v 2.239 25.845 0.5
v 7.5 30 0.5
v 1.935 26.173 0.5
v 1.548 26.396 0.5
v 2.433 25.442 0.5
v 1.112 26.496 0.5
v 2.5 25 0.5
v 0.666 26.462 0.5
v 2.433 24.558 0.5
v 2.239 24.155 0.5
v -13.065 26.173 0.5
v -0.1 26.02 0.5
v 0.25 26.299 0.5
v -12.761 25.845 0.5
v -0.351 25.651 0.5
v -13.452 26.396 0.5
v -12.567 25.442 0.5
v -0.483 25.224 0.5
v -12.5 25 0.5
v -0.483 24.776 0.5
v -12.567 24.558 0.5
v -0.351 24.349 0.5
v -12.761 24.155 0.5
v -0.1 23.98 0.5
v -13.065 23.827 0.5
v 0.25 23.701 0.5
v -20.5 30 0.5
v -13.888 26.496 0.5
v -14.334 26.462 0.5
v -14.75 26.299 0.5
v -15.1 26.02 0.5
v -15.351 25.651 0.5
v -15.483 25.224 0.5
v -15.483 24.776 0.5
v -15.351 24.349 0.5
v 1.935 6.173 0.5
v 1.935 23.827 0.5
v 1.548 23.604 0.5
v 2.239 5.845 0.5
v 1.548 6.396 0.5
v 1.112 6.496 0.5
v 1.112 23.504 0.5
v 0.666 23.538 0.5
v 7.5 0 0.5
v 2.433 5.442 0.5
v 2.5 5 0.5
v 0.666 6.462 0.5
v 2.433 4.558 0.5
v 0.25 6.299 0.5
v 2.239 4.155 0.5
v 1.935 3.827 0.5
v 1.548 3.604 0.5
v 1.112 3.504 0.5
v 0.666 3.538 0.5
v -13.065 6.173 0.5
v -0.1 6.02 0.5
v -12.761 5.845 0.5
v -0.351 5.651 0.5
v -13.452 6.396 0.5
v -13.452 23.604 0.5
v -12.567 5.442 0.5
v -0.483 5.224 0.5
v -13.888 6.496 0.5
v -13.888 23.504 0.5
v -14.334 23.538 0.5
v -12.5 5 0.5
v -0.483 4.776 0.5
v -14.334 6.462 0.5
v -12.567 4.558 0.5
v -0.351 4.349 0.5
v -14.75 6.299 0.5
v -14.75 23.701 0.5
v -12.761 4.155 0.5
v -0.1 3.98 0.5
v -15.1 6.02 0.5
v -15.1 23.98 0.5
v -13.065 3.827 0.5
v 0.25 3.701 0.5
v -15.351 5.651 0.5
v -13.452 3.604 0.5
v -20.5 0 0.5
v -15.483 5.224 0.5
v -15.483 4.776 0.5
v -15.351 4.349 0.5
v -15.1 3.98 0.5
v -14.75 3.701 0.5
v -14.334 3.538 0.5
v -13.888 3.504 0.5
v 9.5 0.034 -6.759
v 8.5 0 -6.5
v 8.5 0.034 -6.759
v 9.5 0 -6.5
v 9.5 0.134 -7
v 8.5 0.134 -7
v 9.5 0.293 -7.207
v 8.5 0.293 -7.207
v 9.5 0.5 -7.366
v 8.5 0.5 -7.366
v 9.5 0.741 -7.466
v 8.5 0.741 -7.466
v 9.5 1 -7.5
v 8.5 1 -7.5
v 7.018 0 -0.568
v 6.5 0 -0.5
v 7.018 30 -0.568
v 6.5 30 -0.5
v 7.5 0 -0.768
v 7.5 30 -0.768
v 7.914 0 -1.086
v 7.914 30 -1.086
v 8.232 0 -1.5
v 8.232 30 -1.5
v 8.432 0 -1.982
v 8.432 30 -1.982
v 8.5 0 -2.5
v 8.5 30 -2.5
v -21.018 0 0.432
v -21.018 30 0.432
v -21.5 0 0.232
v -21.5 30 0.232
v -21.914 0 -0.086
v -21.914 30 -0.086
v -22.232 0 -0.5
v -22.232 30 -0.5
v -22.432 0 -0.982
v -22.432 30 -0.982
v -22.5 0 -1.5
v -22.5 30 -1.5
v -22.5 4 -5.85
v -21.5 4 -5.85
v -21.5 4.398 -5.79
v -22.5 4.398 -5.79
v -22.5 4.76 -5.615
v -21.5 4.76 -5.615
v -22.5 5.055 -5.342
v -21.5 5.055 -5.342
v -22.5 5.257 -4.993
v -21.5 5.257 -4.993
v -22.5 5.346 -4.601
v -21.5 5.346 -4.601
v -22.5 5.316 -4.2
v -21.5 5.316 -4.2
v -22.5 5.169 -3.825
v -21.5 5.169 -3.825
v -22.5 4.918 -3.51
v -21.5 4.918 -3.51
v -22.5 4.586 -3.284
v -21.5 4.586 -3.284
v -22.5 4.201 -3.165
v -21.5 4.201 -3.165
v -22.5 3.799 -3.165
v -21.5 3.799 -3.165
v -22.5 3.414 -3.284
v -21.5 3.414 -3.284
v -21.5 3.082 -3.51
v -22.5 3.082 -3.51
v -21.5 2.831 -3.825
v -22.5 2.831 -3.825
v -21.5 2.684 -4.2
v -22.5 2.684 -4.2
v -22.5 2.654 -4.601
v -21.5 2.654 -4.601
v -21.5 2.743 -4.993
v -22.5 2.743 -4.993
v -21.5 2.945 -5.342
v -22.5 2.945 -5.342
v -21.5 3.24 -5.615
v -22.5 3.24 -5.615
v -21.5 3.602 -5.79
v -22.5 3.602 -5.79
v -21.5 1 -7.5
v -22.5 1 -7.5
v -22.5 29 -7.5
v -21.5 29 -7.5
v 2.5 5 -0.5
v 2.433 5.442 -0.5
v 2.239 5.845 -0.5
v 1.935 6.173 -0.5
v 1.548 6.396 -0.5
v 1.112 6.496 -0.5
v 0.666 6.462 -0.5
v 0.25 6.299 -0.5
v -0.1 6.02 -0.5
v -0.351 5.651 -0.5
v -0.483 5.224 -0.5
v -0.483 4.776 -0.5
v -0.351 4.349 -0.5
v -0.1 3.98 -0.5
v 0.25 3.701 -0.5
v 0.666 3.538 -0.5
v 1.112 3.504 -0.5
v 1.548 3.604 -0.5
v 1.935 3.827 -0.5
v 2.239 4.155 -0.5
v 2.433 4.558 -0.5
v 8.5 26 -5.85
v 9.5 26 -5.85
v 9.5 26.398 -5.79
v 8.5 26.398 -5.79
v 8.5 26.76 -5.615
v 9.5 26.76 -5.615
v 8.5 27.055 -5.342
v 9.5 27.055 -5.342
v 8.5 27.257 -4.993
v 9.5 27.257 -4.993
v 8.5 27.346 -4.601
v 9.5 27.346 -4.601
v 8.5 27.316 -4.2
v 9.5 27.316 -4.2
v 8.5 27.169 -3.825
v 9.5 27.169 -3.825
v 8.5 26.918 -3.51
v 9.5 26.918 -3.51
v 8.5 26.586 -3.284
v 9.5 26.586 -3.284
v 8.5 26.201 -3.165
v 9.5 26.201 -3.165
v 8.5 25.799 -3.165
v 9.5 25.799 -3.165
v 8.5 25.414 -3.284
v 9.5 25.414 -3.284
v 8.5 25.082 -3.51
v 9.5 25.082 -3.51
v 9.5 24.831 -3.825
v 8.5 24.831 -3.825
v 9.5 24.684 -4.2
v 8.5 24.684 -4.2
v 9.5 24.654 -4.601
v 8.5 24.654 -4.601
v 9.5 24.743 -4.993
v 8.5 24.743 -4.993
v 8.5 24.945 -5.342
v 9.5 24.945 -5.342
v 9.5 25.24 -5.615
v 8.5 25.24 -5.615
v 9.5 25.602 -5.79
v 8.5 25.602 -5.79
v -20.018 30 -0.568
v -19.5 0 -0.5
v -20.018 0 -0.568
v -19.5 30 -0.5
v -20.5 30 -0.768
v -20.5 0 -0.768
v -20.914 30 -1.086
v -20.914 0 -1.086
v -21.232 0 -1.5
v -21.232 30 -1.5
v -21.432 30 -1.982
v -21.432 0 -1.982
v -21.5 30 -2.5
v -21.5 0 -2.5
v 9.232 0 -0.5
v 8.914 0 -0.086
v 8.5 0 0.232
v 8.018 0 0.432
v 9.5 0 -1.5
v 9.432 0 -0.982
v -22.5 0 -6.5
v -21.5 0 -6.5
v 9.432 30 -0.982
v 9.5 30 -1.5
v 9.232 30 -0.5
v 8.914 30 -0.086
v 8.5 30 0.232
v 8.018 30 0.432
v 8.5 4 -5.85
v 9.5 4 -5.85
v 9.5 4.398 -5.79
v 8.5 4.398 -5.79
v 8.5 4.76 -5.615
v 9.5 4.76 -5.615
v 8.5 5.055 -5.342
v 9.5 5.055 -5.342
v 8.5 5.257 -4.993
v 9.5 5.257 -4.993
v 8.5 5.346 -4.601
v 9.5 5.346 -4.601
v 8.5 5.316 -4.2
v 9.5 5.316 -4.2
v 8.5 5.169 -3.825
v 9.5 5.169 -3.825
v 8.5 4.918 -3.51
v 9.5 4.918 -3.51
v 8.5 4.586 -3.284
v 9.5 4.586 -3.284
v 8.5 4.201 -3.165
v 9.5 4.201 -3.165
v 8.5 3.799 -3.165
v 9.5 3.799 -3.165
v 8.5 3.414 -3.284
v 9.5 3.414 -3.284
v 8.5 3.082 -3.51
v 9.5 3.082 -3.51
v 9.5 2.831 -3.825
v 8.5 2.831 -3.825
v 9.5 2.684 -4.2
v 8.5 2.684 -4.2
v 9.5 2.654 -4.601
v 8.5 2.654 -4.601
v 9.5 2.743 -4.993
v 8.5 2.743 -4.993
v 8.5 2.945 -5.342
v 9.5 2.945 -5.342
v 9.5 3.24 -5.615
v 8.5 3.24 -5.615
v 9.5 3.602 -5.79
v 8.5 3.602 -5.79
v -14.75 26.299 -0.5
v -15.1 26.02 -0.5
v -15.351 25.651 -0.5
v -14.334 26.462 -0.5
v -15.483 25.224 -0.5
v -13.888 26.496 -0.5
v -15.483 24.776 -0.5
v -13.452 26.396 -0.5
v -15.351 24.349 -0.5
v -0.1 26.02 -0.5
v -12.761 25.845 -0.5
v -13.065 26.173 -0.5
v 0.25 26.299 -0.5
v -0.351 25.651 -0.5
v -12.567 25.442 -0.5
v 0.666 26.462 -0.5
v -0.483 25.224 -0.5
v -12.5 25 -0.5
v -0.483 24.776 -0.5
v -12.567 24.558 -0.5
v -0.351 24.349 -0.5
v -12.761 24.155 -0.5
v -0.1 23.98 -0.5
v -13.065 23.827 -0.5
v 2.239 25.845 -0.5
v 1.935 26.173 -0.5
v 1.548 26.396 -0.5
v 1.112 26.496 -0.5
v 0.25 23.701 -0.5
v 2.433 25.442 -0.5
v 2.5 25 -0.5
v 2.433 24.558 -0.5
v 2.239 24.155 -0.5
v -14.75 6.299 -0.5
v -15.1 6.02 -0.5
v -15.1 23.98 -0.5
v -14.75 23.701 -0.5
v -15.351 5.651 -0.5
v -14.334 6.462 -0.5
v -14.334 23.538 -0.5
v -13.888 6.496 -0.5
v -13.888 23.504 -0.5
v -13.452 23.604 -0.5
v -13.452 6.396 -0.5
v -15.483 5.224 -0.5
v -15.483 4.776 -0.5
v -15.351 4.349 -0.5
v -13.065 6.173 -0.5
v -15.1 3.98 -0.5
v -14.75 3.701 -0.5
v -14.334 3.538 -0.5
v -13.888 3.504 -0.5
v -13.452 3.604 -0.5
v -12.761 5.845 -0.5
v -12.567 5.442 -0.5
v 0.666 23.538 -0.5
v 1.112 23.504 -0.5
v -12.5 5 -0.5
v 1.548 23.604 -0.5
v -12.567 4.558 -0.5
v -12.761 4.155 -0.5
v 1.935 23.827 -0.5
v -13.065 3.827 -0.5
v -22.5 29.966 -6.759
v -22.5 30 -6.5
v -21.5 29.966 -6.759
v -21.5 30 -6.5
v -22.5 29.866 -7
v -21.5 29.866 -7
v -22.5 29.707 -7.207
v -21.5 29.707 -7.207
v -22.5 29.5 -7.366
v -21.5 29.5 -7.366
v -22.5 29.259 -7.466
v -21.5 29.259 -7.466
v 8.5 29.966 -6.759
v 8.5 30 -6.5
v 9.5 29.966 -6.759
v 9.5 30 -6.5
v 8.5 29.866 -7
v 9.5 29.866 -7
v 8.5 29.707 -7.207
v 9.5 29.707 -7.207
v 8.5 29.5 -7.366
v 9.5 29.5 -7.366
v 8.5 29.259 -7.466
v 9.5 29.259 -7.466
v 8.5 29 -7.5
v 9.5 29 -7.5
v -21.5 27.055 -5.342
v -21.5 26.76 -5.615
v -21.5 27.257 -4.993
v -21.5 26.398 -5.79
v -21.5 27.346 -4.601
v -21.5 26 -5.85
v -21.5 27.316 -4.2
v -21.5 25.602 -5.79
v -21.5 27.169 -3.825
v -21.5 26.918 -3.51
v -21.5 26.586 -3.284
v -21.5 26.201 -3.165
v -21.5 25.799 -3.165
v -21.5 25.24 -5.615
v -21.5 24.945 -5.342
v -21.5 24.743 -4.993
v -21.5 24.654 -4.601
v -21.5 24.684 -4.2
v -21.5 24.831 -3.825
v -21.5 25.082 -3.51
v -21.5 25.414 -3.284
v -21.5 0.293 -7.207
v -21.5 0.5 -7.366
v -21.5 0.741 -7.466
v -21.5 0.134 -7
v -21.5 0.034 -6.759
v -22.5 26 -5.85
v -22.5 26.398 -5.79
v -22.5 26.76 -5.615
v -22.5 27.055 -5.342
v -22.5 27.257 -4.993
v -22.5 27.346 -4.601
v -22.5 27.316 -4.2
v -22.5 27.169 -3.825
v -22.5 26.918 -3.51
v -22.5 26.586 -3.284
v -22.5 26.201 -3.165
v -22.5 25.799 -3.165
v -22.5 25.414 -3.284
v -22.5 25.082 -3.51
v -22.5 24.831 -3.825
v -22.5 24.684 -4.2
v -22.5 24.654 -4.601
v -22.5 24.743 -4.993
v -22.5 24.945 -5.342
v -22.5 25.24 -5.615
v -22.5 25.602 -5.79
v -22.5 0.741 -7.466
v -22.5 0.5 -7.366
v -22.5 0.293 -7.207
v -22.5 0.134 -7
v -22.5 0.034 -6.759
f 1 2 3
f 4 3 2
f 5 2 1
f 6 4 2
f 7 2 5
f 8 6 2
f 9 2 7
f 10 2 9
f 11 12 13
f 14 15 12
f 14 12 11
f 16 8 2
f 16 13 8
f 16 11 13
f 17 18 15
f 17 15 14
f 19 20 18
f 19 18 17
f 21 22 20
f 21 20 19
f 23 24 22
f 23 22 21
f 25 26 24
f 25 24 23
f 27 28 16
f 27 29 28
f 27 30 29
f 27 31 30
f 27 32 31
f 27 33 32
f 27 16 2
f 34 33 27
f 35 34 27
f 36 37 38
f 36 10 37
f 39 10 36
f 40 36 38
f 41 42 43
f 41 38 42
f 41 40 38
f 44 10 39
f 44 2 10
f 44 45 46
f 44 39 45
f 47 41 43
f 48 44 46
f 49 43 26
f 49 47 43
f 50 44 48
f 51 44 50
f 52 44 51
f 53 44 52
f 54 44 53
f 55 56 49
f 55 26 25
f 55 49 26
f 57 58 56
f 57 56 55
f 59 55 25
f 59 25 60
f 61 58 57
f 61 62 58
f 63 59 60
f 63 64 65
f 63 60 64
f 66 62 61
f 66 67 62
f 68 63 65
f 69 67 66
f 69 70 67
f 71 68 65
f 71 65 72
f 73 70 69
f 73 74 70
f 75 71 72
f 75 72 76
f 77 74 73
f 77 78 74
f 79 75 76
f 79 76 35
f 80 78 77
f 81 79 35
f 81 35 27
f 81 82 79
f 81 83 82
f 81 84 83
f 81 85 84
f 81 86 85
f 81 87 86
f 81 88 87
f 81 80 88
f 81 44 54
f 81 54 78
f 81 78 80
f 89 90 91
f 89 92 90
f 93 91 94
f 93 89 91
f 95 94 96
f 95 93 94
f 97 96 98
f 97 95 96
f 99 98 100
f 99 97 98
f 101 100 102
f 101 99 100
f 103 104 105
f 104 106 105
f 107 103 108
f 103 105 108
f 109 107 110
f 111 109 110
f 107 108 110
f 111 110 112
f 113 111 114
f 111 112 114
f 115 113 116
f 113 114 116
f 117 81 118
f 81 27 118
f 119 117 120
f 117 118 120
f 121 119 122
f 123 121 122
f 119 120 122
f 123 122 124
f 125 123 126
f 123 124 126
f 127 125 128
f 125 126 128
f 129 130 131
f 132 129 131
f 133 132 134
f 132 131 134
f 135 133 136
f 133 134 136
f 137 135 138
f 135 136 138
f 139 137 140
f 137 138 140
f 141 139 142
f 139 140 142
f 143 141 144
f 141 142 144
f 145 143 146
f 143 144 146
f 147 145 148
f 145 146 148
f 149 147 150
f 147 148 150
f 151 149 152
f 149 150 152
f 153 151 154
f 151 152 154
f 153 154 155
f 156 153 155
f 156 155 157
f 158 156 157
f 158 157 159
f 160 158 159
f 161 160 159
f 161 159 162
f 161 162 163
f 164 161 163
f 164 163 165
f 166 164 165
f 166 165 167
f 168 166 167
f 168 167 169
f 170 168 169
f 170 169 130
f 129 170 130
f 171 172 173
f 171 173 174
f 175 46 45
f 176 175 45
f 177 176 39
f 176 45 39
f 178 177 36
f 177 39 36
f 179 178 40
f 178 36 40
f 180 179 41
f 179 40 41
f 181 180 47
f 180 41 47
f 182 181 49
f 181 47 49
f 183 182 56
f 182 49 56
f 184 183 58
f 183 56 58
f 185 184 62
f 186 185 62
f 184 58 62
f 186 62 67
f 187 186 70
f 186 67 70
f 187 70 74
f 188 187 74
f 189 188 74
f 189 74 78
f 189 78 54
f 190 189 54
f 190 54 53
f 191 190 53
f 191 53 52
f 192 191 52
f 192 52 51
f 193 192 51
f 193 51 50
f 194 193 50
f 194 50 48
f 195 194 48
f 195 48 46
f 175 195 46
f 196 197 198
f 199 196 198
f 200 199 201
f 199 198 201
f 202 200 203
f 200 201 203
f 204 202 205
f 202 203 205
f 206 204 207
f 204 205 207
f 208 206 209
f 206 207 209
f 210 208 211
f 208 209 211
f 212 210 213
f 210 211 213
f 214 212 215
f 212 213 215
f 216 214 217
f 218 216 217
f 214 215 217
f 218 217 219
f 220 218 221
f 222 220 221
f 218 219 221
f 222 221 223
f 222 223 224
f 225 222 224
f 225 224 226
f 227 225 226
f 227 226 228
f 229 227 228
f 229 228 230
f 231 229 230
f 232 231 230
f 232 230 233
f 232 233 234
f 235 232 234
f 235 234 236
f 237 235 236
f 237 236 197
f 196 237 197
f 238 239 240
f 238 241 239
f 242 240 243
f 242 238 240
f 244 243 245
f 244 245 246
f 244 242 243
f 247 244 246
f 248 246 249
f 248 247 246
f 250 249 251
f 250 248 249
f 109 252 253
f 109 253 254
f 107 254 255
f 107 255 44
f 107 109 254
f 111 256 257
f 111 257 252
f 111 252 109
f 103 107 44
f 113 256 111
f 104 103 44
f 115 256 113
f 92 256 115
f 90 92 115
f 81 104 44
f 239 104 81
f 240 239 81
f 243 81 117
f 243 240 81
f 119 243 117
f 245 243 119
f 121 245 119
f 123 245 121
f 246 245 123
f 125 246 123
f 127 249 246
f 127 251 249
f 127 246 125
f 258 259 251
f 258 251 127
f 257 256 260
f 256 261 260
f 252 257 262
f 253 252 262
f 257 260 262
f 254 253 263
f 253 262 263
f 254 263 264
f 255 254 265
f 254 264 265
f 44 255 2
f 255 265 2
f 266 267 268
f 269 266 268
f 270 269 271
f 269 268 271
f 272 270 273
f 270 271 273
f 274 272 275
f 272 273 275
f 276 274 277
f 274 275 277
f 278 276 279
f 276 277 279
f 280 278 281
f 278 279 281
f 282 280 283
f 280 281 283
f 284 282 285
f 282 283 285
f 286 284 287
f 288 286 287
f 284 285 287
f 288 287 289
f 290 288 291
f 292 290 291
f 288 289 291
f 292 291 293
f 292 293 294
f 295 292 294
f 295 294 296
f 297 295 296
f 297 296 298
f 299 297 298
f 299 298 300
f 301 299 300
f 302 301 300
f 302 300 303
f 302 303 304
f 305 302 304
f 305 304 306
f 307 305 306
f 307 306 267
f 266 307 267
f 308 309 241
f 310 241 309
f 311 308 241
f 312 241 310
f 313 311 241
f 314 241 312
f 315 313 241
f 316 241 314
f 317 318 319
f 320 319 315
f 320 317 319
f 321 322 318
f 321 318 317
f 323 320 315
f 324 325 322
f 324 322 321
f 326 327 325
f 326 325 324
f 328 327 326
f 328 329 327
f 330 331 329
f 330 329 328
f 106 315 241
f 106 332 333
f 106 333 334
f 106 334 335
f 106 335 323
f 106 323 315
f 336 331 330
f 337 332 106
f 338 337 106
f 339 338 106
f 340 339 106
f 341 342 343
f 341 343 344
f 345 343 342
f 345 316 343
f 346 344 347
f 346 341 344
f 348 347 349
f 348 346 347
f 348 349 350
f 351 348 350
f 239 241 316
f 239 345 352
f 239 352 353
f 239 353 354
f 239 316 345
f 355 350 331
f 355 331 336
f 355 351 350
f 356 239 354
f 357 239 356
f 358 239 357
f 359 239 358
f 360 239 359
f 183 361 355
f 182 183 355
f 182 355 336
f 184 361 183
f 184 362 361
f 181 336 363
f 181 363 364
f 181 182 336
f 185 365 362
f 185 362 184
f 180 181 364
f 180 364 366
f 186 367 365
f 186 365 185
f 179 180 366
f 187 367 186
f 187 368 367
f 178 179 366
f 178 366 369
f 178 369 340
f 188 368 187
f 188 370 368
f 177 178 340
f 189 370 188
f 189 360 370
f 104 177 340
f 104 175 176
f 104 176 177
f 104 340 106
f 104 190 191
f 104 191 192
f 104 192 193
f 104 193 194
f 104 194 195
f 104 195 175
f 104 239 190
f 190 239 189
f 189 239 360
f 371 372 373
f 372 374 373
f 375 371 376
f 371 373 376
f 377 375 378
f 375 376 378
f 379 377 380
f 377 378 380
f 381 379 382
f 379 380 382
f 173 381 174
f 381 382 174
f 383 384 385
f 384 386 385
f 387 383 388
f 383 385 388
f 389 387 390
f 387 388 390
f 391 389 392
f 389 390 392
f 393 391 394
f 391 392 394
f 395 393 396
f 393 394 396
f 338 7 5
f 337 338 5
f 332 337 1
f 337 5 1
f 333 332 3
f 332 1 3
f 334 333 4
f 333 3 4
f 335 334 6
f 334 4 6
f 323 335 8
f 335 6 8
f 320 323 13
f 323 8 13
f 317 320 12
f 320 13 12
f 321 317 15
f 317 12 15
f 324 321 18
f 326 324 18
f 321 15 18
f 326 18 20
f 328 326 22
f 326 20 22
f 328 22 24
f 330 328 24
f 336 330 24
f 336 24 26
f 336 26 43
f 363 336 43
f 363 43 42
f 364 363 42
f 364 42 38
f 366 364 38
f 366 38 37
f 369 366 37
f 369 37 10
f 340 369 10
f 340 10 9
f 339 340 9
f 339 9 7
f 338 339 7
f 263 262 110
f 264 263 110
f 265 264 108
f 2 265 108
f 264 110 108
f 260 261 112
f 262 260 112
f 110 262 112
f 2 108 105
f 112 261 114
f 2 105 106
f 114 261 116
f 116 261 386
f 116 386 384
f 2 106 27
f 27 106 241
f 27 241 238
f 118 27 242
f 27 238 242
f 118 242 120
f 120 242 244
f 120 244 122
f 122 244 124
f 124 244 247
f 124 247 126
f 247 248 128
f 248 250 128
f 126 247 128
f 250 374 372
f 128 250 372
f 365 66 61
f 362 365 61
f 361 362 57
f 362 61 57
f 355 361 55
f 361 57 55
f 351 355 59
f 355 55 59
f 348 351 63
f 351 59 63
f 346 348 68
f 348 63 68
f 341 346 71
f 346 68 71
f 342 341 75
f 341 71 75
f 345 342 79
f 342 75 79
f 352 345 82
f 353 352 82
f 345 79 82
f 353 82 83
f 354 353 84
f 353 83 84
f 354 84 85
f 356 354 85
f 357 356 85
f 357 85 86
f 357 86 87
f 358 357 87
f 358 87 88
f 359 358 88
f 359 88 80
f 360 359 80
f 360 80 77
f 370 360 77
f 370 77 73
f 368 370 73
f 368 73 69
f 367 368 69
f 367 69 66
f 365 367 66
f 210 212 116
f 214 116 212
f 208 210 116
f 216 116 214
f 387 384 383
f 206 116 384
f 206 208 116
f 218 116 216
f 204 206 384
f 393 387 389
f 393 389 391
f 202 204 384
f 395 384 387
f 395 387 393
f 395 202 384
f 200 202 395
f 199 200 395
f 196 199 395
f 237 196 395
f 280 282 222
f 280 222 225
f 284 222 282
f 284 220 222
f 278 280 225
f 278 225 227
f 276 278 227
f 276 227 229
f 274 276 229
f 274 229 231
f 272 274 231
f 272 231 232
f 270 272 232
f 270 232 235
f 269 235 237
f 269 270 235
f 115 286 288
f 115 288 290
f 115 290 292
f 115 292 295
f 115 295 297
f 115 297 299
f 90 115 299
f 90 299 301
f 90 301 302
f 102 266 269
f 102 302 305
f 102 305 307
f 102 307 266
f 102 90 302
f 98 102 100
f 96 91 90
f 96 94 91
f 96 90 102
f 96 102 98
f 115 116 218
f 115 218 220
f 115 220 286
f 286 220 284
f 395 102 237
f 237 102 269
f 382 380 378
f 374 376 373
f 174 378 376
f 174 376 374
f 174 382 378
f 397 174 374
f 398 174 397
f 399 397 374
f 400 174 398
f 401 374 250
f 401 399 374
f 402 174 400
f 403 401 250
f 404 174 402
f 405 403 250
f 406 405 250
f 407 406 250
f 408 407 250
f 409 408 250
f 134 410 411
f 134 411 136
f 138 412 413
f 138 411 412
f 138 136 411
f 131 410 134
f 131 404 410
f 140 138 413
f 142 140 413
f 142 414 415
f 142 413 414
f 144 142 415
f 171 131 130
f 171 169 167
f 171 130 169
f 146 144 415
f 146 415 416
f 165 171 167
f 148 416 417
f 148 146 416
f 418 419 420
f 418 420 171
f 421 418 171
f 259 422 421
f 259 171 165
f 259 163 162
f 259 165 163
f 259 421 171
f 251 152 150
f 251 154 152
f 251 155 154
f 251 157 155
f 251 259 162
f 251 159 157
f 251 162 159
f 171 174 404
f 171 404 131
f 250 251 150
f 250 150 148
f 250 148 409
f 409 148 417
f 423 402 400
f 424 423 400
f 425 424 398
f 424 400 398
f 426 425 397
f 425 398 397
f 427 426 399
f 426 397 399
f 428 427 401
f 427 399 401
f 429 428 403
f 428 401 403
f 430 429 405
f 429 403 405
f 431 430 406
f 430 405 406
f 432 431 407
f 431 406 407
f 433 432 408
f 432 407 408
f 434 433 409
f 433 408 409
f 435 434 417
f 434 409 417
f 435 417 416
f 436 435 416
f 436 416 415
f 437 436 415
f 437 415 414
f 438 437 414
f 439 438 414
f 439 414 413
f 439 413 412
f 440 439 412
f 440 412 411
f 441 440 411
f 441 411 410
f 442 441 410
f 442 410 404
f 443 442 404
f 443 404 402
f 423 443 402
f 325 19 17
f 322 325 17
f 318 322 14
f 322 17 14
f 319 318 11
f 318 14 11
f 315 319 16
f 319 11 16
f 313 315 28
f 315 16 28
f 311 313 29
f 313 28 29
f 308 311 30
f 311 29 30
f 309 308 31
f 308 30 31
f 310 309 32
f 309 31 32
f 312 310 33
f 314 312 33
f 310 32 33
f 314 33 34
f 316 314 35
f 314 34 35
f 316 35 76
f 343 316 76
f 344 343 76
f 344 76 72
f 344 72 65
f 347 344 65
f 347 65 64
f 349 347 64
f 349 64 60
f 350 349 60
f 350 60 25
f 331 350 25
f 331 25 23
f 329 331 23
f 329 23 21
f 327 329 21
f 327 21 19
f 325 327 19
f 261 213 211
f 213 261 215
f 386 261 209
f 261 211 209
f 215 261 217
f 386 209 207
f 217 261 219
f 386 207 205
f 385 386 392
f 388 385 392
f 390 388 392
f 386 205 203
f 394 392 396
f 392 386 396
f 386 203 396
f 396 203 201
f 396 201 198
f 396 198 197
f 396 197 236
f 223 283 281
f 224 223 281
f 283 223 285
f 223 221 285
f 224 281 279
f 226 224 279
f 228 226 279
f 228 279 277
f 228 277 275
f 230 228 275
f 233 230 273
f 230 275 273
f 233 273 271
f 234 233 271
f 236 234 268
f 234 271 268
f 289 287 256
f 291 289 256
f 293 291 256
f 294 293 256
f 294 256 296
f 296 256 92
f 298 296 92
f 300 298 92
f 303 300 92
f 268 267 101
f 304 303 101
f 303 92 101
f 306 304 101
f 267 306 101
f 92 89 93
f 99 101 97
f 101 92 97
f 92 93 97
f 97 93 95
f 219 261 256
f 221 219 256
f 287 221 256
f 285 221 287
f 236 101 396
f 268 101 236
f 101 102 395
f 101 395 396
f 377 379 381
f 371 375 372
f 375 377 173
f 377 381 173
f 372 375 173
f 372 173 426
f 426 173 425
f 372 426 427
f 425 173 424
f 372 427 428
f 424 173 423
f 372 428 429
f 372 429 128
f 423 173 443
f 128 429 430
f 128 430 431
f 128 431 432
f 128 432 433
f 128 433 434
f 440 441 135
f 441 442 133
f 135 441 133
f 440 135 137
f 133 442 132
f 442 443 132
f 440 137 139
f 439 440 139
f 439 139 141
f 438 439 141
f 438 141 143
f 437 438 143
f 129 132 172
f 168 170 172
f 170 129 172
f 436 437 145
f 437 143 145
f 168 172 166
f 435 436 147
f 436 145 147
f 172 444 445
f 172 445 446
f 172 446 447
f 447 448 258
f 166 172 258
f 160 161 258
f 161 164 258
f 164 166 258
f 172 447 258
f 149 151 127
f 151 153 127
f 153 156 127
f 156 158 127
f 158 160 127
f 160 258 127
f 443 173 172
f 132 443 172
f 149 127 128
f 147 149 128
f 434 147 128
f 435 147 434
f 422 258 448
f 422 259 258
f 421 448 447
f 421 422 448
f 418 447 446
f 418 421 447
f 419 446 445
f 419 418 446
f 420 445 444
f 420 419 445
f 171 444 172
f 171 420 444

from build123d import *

# Parameters (mm, degrees)
BOSS_EXTRUDE1_DEPTH = 30
FILLET2_R           = 2
SKETCH3_R           = 1.5
CUT_EXTRUDE4_DEPTH  = 9
SKETCH4_R           = 1.35
CUT_EXTRUDE3_DEPTH  = 33
FILLET3_R           = 1


with BuildPart() as part:
    # Sketch1 → Boss-Extrude1 (new body)
    with BuildSketch(Plane(origin=(0, 0, 0), x_dir=(1, 0, 0), z_dir=(0, 1, 0))):
        Polygon((-21.5, 0.5), (8.5, 0.5), (8.5, 7.5), (9.5, 7.5), (9.5, 0.5), (9.5, -0.5), (-22.5, -0.5), (-22.5, 0.5), (-22.5, 7.5), (-21.5, 7.5), align=None)
    extrude(amount=BOSS_EXTRUDE1_DEPTH)

    # Fillet2
    fillet2_edges = [part.edges().sort_by_distance(p)[0] for p in [
        (9.5, 15, 0.5),
        (-22.5, 15, 0.5),
        (-21.5, 15, -0.5),
        (8.5, 15, -0.5),
    ]]
    fillet(fillet2_edges, radius=FILLET2_R)

    # Sketch3 → Cut-Extrude4 (cut, through all)
    with BuildSketch(Plane.XY.offset(0.5)):
        with Locations((-14, 25)):
            Circle(SKETCH3_R)
        with Locations((1, 25)):
            Circle(SKETCH3_R)
        with Locations((-14, 5)):
            Circle(SKETCH3_R)
        with Locations((1, 5)):
            Circle(SKETCH3_R)
    extrude(amount=-CUT_EXTRUDE4_DEPTH, mode=Mode.SUBTRACT)

    # Sketch4 → Cut-Extrude3 (cut, through all)
    with BuildSketch(Plane(origin=(9.5, 0, 0), x_dir=(0, 0, -1), z_dir=(1, 0, 0))):
        with Locations((4.5, 26)):
            Circle(SKETCH4_R)
        with Locations((4.5, 4)):
            Circle(SKETCH4_R)
    extrude(amount=-CUT_EXTRUDE3_DEPTH, mode=Mode.SUBTRACT)

    # Fillet3
    fillet3_edges = [part.edges().sort_by_distance(p)[0] for p in [
        (9, 30, -7.5),
        (-22, 0, -7.5),
        (9, 0, -7.5),
        (-22, 30, -7.5),
    ]]
    fillet(fillet3_edges, radius=FILLET3_R)


solid = part.part
